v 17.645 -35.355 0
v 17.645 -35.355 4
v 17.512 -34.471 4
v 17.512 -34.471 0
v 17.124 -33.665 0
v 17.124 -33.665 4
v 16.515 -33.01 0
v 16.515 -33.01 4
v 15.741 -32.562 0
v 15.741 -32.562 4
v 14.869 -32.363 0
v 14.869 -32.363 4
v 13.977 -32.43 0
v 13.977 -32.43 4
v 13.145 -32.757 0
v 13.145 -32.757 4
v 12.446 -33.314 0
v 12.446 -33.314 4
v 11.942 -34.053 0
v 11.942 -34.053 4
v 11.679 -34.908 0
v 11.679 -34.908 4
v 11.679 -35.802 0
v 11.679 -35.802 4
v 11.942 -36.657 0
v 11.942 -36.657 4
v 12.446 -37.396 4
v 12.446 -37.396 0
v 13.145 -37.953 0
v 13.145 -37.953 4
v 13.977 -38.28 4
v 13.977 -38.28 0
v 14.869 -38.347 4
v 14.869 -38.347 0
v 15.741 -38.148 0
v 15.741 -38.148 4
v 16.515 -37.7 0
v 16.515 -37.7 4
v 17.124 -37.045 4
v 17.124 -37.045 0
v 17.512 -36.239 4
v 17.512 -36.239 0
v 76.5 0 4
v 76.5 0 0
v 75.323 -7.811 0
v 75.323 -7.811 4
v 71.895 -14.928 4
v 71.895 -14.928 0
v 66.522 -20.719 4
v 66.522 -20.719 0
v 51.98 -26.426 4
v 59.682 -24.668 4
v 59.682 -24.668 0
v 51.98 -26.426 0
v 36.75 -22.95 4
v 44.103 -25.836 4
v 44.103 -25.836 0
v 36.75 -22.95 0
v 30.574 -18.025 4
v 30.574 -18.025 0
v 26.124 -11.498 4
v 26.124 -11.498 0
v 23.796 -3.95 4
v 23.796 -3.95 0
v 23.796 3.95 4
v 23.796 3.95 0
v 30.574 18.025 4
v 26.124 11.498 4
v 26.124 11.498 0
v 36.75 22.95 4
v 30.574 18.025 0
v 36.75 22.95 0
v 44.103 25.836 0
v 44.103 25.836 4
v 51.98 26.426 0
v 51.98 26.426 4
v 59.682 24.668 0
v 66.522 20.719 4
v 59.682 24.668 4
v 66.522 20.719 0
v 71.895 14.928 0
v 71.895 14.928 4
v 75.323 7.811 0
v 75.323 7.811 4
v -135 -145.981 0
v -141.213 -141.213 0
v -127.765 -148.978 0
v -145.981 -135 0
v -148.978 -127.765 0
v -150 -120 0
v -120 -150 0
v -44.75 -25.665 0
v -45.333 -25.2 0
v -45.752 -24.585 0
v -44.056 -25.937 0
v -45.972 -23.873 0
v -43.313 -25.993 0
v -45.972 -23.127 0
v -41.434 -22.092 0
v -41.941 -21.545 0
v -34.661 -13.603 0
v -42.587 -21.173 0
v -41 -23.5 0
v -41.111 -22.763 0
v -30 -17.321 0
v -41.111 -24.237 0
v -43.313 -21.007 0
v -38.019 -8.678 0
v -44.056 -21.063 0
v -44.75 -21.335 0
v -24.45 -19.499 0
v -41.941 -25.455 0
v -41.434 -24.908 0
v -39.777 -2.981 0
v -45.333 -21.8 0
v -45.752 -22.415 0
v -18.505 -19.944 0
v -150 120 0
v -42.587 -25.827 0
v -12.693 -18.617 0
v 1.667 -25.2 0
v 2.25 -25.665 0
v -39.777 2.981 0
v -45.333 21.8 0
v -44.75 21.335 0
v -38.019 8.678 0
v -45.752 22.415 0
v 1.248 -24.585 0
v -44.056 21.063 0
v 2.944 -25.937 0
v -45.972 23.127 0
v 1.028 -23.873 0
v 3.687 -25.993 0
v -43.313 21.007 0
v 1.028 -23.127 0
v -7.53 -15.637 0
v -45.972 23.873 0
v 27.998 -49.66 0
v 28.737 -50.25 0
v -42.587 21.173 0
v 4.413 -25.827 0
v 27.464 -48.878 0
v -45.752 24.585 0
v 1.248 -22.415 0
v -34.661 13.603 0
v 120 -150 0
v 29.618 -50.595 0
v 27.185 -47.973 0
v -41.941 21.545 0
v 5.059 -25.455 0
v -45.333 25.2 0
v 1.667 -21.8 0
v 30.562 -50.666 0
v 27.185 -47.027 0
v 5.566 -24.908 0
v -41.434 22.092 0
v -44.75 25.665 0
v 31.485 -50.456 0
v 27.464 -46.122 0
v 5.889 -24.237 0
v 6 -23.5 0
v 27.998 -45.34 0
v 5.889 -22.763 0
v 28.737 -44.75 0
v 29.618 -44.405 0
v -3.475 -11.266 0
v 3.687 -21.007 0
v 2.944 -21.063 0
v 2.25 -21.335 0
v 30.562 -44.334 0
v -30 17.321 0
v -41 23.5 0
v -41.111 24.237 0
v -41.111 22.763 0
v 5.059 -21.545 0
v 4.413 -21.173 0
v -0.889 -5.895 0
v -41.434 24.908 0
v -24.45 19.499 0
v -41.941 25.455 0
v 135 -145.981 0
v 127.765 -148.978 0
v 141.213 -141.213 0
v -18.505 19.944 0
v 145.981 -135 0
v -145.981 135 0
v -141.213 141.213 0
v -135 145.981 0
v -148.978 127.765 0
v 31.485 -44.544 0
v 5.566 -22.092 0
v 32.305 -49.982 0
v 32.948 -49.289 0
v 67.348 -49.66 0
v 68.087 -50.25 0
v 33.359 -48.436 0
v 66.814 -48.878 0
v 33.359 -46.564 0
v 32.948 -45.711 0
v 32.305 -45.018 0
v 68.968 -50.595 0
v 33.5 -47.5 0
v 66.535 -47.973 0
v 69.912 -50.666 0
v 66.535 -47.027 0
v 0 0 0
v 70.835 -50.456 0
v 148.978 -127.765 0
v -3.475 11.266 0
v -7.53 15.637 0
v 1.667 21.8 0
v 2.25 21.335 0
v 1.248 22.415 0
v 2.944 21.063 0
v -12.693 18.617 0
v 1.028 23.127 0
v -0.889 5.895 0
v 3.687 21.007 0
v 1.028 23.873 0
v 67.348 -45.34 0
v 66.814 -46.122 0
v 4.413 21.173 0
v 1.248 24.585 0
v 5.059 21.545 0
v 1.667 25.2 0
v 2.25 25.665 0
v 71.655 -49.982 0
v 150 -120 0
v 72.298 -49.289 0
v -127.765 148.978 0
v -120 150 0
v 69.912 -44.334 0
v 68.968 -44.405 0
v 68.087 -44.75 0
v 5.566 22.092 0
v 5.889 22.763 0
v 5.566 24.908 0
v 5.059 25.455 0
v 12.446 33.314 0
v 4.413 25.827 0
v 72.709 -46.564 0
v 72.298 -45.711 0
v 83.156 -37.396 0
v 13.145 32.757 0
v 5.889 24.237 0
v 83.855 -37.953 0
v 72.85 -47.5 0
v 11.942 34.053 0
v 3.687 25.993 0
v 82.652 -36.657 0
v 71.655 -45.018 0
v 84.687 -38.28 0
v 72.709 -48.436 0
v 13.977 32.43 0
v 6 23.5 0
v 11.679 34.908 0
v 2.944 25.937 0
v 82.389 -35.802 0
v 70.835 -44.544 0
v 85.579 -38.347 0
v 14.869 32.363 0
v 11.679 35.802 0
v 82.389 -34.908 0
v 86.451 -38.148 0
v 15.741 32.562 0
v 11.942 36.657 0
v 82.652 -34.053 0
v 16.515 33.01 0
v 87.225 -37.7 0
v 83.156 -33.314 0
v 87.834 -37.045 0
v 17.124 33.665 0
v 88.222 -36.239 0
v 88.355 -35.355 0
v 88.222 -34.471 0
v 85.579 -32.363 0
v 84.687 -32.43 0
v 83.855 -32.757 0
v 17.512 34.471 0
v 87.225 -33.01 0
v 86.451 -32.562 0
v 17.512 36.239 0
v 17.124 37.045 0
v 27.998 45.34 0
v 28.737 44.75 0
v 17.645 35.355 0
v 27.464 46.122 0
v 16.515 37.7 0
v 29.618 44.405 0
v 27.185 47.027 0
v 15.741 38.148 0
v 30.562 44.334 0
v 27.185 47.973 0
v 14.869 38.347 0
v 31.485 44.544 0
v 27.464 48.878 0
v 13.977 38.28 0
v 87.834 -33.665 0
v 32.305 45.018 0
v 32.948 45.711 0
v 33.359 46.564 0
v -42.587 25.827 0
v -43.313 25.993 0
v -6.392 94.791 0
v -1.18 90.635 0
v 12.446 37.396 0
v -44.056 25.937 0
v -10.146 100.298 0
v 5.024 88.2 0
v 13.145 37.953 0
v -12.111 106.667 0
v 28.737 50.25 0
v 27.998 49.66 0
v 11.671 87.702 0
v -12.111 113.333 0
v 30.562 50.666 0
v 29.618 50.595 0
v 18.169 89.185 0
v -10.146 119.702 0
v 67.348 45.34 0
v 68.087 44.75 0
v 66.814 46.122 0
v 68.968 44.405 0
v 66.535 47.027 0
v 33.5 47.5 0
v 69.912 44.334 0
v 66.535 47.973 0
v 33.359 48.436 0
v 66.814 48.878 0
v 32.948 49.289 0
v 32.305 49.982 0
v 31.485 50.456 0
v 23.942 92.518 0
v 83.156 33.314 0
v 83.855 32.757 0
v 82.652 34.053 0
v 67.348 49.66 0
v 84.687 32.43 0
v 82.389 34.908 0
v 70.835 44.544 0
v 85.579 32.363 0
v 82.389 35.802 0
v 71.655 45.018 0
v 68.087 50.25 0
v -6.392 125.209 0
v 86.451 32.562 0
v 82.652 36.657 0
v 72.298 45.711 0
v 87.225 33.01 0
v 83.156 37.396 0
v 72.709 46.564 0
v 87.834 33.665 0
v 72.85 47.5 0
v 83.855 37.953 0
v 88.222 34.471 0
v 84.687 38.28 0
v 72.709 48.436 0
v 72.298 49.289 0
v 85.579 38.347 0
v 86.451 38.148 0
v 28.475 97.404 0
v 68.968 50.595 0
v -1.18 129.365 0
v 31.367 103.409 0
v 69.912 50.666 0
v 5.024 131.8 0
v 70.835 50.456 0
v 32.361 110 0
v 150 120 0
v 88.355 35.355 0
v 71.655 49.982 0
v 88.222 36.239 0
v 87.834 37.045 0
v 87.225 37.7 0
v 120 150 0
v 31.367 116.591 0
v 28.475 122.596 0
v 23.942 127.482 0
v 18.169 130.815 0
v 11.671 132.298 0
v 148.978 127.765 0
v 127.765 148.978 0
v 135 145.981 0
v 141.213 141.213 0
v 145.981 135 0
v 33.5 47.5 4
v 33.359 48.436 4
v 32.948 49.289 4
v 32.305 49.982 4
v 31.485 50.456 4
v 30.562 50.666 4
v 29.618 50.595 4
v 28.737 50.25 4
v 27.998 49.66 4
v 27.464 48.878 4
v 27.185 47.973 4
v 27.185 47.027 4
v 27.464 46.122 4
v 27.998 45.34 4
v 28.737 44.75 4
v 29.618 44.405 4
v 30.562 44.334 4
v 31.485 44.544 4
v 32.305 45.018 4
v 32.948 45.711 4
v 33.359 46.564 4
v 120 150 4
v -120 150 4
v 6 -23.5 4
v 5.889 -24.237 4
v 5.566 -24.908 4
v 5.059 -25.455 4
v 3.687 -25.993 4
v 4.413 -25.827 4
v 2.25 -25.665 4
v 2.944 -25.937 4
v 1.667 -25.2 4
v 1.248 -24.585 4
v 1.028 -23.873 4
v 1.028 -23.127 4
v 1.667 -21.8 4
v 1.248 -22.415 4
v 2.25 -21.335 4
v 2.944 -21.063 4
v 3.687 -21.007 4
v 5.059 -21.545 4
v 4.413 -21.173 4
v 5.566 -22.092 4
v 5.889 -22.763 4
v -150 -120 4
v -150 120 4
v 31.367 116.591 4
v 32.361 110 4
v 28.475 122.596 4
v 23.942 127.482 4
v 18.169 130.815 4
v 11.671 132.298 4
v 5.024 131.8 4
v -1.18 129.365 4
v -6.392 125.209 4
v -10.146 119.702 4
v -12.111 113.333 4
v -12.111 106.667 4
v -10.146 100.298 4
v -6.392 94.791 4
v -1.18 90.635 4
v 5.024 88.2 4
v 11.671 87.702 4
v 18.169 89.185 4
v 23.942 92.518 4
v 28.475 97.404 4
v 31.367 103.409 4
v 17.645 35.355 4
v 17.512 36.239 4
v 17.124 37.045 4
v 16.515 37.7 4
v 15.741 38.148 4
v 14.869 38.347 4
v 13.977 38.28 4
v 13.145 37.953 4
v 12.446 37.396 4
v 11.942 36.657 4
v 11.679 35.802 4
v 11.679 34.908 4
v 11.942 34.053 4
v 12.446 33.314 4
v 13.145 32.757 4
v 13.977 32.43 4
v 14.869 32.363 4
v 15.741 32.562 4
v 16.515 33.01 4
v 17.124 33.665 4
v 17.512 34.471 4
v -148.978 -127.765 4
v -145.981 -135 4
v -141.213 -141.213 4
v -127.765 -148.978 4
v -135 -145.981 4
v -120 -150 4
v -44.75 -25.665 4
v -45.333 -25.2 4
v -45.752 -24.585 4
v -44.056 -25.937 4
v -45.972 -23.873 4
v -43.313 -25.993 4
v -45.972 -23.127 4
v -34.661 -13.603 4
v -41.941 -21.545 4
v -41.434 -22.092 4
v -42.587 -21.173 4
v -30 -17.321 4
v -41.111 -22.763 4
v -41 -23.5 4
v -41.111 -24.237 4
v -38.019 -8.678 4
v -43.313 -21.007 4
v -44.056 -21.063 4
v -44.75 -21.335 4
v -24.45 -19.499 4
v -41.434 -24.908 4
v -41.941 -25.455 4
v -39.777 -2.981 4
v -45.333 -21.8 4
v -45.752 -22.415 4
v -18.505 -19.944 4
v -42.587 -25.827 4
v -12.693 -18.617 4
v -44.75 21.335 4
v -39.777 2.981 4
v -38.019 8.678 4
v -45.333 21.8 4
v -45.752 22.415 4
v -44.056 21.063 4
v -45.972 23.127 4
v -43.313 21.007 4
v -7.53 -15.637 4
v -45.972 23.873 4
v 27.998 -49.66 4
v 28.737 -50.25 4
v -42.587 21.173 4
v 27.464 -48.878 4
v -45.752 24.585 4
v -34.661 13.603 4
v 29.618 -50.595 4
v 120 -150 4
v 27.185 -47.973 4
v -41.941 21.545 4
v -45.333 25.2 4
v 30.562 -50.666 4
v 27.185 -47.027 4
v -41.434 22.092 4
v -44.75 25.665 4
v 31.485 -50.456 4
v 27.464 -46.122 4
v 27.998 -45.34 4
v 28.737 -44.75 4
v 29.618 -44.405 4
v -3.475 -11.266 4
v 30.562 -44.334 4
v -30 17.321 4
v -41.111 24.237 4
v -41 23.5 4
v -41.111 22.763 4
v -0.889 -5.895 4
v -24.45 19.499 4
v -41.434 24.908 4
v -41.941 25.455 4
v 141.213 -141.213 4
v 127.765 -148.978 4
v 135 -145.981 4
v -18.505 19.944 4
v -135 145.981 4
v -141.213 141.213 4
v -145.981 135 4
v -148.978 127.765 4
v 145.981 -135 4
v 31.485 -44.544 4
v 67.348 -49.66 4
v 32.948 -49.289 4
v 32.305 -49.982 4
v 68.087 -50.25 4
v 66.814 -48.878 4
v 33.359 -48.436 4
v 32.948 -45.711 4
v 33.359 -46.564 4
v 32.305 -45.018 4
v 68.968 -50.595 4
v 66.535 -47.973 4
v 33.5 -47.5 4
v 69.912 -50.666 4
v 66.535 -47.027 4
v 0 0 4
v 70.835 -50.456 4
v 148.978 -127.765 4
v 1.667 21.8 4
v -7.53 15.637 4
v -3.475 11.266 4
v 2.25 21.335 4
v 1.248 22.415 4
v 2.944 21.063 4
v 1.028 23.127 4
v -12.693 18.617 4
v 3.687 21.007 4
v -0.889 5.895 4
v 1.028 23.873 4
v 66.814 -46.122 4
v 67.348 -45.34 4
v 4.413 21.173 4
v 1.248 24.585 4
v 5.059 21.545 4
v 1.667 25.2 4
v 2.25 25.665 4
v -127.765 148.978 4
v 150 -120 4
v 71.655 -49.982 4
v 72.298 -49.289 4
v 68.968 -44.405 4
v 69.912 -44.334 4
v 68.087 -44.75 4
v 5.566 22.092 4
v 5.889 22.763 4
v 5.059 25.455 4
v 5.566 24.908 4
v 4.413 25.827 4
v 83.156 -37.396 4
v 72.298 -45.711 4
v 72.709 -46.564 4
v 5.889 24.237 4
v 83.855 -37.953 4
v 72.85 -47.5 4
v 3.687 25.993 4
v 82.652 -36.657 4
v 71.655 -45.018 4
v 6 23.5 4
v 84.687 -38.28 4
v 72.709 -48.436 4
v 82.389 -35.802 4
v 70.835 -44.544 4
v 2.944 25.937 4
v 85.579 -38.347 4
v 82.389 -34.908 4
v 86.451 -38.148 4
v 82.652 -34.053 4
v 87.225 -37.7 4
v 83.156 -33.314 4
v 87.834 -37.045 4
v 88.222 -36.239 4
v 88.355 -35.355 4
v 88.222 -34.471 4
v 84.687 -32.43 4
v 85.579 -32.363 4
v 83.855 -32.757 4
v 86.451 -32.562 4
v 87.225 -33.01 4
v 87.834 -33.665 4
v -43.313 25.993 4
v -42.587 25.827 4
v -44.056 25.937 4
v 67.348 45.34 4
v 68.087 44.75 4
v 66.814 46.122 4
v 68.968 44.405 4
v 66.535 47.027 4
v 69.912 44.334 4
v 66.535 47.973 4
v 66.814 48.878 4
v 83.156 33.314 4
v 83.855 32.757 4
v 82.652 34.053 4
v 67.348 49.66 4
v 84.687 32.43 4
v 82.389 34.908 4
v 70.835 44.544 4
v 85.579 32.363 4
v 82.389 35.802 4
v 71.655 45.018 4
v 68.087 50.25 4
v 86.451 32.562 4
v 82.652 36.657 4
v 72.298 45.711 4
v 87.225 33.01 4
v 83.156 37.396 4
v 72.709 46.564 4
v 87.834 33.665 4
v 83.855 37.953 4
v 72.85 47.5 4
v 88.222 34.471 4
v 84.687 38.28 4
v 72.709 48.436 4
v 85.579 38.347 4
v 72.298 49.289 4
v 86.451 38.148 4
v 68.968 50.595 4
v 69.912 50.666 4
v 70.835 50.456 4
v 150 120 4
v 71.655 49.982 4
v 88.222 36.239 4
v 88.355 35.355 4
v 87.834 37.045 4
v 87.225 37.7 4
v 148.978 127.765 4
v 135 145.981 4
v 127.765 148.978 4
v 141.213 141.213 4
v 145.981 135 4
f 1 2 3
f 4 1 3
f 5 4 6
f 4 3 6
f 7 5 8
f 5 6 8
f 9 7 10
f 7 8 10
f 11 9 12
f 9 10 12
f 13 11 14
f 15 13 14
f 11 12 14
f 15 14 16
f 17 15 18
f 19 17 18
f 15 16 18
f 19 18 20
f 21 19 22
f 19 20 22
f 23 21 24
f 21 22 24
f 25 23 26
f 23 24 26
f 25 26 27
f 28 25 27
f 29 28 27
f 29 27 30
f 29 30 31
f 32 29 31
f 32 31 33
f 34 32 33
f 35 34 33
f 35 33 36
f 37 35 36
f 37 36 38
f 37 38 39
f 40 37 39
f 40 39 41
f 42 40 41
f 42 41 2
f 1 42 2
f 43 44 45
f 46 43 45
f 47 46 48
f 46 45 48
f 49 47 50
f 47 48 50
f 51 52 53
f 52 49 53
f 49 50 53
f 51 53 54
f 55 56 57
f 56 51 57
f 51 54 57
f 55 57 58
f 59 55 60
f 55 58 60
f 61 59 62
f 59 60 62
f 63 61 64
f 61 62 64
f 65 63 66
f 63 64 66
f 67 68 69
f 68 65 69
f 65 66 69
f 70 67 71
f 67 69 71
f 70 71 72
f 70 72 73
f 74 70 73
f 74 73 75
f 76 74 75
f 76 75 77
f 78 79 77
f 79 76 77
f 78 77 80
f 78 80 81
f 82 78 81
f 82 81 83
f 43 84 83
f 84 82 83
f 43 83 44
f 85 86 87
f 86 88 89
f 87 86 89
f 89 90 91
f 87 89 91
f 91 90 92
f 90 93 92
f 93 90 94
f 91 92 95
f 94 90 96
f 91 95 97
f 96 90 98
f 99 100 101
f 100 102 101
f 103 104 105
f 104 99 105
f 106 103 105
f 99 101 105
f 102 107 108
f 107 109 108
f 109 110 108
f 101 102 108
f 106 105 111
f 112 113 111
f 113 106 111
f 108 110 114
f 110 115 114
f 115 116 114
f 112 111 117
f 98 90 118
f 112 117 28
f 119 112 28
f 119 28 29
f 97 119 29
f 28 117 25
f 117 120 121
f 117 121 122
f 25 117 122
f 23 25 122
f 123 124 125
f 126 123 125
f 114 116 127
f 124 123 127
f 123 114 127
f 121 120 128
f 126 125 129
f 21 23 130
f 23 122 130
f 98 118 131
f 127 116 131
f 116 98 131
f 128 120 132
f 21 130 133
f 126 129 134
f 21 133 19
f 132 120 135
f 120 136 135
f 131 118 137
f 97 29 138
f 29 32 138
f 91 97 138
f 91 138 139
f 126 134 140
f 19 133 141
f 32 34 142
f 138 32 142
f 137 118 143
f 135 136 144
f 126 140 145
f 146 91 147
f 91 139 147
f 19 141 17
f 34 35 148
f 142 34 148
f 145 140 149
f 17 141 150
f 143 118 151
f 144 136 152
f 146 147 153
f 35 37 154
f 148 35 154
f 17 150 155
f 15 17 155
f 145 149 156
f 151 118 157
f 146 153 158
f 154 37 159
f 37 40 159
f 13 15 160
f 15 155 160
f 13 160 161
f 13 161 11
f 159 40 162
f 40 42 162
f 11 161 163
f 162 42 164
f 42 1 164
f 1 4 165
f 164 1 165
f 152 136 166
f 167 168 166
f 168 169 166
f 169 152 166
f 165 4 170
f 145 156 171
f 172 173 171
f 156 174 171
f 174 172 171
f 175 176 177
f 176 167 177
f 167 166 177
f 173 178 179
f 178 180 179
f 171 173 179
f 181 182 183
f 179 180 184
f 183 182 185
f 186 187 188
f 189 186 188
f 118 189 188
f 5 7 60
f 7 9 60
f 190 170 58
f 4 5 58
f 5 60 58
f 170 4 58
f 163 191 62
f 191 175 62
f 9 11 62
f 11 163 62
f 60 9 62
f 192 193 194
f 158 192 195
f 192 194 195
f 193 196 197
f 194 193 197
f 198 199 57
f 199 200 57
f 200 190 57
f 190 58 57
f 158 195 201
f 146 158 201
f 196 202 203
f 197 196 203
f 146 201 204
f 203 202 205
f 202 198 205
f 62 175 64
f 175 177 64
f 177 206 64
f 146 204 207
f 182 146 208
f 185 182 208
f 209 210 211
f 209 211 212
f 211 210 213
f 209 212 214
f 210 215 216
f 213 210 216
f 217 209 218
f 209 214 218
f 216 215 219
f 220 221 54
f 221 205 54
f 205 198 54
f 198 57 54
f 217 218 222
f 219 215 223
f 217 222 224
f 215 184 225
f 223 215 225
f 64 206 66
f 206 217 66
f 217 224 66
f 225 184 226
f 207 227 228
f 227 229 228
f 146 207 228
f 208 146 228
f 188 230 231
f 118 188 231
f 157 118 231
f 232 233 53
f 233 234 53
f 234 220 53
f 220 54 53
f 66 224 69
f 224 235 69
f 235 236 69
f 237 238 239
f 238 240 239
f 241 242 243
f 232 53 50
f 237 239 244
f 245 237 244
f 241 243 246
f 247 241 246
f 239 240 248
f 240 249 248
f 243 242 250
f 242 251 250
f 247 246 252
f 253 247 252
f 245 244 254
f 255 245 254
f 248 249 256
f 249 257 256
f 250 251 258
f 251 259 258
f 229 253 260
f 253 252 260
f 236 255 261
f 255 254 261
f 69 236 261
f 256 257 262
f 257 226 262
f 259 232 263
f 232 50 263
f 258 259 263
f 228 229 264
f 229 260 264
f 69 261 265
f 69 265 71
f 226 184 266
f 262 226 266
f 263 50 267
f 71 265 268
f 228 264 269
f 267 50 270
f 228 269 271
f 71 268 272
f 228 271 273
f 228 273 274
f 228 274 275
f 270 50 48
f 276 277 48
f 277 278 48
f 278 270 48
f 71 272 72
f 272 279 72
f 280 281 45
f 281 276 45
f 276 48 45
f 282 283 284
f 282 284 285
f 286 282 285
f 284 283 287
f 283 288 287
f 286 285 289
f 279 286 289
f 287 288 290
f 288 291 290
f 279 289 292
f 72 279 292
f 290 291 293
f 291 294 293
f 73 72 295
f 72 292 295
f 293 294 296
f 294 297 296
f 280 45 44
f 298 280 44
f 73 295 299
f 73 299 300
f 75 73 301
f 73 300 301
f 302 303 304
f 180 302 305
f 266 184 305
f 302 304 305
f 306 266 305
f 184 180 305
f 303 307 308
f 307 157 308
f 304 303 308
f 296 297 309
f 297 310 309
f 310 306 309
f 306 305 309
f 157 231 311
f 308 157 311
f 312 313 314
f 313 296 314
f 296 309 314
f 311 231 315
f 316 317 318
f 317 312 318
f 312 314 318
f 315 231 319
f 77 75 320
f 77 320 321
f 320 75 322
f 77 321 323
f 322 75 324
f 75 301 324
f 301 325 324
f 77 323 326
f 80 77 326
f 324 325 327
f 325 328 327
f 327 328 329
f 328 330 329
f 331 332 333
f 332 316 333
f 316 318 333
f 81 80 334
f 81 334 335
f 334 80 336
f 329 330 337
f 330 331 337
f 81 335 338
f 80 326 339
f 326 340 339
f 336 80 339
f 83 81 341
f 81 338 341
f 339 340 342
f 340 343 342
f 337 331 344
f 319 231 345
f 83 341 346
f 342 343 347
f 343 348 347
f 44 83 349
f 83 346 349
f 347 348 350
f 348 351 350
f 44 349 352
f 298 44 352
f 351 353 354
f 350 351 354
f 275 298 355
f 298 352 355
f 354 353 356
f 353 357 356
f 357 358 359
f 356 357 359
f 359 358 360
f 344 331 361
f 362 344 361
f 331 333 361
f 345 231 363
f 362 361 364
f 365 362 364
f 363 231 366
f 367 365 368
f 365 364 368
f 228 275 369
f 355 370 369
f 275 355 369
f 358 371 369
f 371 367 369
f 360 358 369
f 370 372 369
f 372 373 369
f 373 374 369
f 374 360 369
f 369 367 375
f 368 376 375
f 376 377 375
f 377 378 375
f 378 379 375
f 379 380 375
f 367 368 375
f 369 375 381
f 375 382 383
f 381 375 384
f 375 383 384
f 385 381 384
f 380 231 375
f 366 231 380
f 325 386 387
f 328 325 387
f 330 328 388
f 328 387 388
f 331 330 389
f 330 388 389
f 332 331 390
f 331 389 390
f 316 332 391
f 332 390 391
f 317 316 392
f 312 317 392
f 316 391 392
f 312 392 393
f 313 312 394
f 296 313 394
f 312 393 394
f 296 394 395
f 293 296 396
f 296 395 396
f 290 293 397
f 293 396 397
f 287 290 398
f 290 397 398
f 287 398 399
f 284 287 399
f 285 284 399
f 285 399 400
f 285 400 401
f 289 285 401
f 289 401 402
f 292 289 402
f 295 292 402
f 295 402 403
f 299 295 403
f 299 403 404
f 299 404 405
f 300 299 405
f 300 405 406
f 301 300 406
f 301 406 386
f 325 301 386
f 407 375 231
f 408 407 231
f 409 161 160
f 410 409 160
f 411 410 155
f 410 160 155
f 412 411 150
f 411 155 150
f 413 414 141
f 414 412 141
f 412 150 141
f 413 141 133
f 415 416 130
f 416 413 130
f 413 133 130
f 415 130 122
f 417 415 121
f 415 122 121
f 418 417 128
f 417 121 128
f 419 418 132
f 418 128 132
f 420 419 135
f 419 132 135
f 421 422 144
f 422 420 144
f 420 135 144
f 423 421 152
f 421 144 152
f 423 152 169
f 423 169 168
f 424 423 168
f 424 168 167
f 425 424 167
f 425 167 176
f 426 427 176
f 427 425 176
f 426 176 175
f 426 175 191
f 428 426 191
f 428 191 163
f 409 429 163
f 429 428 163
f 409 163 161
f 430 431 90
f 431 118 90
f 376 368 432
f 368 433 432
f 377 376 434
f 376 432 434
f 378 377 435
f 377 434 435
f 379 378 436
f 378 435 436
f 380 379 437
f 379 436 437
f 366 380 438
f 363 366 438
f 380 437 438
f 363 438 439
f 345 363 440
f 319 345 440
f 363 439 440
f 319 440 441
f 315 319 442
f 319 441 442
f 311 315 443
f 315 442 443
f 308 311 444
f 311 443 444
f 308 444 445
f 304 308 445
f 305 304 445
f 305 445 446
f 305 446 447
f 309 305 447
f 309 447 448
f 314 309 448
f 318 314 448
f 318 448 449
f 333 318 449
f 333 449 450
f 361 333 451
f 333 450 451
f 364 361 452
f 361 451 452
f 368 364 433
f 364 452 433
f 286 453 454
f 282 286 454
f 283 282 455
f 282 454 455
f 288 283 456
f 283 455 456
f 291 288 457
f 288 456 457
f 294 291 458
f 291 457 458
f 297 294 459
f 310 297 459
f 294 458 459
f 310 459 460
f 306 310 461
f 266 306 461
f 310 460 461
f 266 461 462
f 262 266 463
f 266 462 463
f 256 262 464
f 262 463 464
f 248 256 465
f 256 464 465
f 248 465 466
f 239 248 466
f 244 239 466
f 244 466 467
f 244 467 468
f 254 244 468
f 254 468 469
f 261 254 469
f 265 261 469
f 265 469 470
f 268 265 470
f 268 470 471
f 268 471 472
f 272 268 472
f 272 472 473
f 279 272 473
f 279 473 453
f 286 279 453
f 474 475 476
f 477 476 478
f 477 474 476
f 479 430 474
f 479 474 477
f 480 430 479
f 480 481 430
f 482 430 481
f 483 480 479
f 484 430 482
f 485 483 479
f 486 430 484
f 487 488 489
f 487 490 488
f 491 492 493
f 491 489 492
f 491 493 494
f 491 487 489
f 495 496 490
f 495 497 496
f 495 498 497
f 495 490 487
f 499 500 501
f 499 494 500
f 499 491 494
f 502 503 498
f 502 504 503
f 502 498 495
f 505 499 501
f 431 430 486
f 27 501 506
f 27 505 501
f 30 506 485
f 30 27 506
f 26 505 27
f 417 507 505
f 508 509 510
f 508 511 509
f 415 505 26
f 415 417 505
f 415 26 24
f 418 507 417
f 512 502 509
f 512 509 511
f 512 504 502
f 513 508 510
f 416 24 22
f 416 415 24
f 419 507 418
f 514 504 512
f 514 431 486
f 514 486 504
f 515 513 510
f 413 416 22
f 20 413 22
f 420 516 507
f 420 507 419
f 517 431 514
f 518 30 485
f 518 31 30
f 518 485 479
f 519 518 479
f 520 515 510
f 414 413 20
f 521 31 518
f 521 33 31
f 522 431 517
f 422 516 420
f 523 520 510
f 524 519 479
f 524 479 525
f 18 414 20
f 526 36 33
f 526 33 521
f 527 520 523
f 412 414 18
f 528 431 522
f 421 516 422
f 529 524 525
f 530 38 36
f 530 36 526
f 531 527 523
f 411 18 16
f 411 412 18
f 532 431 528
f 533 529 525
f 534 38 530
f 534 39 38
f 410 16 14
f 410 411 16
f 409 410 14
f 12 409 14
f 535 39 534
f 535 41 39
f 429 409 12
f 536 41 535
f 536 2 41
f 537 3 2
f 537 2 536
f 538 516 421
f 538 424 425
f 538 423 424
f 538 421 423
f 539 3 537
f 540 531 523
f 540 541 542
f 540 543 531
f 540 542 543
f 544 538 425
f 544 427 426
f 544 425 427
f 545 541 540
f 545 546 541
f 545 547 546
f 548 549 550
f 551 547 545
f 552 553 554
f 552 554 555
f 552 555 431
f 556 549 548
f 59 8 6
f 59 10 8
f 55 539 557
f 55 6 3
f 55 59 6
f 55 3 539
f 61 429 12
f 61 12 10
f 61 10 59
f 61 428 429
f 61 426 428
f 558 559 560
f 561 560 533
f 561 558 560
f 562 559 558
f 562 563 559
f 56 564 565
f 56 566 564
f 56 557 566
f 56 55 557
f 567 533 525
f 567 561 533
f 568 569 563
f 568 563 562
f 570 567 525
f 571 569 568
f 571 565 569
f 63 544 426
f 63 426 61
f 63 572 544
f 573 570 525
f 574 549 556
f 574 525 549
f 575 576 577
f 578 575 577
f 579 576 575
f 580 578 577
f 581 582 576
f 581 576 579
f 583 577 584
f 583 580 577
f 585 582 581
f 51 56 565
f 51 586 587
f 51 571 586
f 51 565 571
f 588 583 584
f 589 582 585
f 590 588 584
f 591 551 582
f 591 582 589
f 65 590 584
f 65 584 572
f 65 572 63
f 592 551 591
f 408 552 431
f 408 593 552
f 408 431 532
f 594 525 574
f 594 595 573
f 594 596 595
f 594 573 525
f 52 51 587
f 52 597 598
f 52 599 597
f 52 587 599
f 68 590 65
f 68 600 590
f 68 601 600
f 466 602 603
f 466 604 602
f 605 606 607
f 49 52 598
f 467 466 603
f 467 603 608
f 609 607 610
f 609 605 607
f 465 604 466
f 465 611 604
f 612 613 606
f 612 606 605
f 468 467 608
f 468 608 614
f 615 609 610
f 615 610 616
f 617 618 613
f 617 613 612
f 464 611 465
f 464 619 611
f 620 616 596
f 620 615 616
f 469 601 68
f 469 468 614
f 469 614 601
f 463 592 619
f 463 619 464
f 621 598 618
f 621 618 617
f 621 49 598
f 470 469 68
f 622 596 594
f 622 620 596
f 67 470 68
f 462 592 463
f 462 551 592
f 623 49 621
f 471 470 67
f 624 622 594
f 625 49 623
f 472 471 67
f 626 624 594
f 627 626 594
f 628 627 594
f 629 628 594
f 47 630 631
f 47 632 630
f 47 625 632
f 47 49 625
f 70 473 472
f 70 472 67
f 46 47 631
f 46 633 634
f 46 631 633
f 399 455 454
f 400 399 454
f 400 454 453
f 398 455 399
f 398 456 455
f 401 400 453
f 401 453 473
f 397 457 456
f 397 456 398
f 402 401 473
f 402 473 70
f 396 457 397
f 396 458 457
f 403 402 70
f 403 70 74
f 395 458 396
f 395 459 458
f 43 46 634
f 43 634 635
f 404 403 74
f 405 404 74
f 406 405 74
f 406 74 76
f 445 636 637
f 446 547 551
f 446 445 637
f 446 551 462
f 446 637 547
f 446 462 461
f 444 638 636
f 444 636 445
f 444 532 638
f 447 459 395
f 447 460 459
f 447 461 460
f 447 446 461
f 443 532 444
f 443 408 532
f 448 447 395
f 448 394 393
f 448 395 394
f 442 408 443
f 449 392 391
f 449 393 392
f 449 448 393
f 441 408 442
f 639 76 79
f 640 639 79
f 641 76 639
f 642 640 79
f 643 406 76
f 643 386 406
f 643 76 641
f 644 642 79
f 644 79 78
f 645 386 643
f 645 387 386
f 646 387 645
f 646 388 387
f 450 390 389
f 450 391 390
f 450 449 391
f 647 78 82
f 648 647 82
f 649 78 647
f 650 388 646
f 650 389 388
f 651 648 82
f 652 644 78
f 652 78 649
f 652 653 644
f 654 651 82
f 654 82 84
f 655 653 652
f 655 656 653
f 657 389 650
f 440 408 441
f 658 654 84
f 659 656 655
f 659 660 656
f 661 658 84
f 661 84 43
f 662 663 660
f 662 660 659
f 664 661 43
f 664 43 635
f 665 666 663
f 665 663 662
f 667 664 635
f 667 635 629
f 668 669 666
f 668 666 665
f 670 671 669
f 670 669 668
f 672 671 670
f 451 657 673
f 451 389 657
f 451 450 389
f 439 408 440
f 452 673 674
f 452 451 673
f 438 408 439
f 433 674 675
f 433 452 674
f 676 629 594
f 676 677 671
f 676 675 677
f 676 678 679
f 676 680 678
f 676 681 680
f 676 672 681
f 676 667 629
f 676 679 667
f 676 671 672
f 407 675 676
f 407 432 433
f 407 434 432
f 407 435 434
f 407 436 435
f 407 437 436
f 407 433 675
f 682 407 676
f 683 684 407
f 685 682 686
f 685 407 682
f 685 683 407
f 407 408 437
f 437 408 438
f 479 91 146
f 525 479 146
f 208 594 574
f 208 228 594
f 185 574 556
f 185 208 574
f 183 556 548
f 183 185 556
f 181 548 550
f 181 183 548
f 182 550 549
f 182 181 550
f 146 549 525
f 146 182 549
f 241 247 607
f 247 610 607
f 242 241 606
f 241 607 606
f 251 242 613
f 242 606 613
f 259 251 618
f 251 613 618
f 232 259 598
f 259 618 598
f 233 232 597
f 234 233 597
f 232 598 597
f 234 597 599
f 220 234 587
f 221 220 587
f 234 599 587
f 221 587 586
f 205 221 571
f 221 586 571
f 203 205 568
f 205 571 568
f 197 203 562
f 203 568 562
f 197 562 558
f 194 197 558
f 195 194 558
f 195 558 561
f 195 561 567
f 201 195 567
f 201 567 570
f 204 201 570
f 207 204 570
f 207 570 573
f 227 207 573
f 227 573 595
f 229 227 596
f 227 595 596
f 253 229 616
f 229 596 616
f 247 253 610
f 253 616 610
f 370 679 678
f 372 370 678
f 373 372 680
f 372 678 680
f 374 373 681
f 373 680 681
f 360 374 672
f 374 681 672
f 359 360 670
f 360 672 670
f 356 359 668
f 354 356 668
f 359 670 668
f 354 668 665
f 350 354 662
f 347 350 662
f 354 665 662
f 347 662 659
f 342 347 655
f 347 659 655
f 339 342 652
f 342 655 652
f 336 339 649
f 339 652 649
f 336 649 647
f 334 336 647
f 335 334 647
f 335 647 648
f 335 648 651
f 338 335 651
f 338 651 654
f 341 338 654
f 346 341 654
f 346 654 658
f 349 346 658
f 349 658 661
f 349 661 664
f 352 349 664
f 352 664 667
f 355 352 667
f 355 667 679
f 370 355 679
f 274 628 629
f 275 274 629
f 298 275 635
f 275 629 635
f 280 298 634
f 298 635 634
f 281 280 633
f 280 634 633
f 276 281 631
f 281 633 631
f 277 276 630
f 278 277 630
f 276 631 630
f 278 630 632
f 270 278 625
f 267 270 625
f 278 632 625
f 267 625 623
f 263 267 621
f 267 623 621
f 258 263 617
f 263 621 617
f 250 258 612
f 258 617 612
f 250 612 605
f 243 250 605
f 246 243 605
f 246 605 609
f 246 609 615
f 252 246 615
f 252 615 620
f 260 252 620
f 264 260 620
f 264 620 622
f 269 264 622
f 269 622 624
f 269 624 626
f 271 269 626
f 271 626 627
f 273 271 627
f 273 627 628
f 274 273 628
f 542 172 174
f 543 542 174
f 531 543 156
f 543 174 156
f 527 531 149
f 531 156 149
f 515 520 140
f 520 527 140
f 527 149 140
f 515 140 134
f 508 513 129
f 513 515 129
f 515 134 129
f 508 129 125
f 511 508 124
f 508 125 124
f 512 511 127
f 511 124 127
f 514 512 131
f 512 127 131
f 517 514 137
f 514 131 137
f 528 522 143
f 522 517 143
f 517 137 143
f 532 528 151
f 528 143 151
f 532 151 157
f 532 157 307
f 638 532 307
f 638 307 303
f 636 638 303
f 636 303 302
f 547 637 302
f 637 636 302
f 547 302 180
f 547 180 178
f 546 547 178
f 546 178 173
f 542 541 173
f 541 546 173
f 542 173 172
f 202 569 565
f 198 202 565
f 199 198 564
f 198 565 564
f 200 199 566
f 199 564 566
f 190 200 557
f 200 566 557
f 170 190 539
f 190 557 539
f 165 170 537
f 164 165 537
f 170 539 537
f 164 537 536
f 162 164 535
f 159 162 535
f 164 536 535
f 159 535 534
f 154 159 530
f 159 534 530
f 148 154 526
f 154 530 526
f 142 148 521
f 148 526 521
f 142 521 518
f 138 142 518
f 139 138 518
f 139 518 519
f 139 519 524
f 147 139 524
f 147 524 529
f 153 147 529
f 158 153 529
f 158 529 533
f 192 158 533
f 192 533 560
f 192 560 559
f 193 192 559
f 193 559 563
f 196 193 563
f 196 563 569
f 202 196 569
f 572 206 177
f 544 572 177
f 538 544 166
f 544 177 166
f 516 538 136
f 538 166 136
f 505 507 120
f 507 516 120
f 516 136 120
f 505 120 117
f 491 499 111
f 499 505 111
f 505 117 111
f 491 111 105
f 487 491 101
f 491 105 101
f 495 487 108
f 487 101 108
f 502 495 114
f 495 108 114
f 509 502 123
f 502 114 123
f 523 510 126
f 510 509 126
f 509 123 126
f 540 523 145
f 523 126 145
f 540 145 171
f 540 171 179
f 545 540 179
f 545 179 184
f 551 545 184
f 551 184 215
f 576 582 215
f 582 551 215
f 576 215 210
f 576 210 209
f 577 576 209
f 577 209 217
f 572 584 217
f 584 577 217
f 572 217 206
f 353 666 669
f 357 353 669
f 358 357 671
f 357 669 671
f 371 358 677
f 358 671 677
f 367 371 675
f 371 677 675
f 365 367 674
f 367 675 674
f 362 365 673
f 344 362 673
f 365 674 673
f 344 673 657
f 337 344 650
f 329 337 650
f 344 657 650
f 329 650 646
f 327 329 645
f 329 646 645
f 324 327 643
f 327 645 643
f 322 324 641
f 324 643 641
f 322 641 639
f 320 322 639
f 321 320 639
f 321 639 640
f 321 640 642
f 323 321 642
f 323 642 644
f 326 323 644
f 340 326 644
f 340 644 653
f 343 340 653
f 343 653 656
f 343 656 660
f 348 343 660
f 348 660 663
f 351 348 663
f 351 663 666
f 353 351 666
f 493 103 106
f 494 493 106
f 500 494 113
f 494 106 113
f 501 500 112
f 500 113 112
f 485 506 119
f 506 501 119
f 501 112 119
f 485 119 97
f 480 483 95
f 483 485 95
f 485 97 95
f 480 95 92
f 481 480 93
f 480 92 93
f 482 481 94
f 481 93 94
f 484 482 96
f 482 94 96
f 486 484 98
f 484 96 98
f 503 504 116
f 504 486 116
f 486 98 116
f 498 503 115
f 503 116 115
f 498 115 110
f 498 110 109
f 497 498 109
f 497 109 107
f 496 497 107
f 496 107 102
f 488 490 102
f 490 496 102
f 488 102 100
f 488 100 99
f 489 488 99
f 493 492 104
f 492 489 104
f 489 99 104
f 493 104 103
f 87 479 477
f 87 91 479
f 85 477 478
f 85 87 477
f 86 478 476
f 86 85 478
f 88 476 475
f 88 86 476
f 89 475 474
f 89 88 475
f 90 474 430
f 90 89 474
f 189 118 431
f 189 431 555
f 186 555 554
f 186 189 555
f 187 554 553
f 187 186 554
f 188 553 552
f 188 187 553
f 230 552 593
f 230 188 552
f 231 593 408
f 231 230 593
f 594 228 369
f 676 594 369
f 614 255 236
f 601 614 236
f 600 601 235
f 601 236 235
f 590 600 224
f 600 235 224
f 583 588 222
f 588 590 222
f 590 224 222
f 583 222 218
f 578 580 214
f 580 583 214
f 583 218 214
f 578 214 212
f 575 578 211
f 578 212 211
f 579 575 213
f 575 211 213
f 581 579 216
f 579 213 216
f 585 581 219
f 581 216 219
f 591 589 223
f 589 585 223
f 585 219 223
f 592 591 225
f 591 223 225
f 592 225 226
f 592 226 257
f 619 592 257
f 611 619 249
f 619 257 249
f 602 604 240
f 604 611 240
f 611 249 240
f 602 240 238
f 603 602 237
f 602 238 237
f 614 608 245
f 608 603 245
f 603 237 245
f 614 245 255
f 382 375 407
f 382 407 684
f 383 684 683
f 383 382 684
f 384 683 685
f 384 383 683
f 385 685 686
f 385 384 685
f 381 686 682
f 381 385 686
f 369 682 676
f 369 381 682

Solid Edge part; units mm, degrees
sketch "Sketch1" plane through (0, 0, 0) normal (0, 0, 1) x (1, 0, 0)
  line L0 (-120, -150) -> (120, -150)
  arc A0 (150, -120) -> (120, -150) centre (120, -120) cw
  line L1 (150, -120) -> (150, 120)
  arc A1 (120, 150) -> (150, 120) centre (120, 120) cw
  line L2 (120, 150) -> (-120, 150)
  arc A2 (-120, 150) -> (-150, 120) centre (-120, 120) ccw
  line L3 (-150, 120) -> (-150, -120)
  arc A3 (-150, -120) -> (-120, -150) centre (-120, -120) ccw
  circle A4 centre (50, 0) radius 26.5
  circle A5 centre (-20, 0) radius 20
  circle A6 centre (3.5, 23.5) radius 2.5
  circle A7 centre (-43.5, 23.5) radius 2.5
  circle A8 centre (-43.5, -23.5) radius 2.5
  circle A9 centre (3.5, -23.5) radius 2.5
extrude "Protrusion1" add sketch "Sketch1" along normal blind 4
sketch "Sketch2" plane through (0, 0, 4) normal (0, 0, 1) x (1, 0, 0)
  circle A0 centre (14.645, -35.355) radius 3
  circle A1 centre (85.355, -35.355) radius 3
  circle A2 centre (85.355, 35.355) radius 3
  circle A3 centre (14.645, 35.355) radius 3
extrude "ExtrudedCutout_1" cut sketch "Sketch2" against normal blind 10
sketch "Sketch3" plane through (0, 0, 4) normal (0, 0, 1) x (1, 0, 0)
  circle A0 centre (30.325, 47.5) radius 3.175
  circle A1 centre (69.675, 47.5) radius 3.175
  circle A2 centre (69.675, -47.5) radius 3.175
  circle A3 centre (30.325, -47.5) radius 3.175
extrude "Cutout1" cut sketch "Sketch3" against normal blind 88
sketch "Sketch4" plane through (0, 0, 4) normal (0, 0, 1) x (1, 0, 0)
  circle A0 centre (10, 110) radius 22.3607
extrude "ExtrudedCutout_3" cut sketch "Sketch4" against normal blind 150
